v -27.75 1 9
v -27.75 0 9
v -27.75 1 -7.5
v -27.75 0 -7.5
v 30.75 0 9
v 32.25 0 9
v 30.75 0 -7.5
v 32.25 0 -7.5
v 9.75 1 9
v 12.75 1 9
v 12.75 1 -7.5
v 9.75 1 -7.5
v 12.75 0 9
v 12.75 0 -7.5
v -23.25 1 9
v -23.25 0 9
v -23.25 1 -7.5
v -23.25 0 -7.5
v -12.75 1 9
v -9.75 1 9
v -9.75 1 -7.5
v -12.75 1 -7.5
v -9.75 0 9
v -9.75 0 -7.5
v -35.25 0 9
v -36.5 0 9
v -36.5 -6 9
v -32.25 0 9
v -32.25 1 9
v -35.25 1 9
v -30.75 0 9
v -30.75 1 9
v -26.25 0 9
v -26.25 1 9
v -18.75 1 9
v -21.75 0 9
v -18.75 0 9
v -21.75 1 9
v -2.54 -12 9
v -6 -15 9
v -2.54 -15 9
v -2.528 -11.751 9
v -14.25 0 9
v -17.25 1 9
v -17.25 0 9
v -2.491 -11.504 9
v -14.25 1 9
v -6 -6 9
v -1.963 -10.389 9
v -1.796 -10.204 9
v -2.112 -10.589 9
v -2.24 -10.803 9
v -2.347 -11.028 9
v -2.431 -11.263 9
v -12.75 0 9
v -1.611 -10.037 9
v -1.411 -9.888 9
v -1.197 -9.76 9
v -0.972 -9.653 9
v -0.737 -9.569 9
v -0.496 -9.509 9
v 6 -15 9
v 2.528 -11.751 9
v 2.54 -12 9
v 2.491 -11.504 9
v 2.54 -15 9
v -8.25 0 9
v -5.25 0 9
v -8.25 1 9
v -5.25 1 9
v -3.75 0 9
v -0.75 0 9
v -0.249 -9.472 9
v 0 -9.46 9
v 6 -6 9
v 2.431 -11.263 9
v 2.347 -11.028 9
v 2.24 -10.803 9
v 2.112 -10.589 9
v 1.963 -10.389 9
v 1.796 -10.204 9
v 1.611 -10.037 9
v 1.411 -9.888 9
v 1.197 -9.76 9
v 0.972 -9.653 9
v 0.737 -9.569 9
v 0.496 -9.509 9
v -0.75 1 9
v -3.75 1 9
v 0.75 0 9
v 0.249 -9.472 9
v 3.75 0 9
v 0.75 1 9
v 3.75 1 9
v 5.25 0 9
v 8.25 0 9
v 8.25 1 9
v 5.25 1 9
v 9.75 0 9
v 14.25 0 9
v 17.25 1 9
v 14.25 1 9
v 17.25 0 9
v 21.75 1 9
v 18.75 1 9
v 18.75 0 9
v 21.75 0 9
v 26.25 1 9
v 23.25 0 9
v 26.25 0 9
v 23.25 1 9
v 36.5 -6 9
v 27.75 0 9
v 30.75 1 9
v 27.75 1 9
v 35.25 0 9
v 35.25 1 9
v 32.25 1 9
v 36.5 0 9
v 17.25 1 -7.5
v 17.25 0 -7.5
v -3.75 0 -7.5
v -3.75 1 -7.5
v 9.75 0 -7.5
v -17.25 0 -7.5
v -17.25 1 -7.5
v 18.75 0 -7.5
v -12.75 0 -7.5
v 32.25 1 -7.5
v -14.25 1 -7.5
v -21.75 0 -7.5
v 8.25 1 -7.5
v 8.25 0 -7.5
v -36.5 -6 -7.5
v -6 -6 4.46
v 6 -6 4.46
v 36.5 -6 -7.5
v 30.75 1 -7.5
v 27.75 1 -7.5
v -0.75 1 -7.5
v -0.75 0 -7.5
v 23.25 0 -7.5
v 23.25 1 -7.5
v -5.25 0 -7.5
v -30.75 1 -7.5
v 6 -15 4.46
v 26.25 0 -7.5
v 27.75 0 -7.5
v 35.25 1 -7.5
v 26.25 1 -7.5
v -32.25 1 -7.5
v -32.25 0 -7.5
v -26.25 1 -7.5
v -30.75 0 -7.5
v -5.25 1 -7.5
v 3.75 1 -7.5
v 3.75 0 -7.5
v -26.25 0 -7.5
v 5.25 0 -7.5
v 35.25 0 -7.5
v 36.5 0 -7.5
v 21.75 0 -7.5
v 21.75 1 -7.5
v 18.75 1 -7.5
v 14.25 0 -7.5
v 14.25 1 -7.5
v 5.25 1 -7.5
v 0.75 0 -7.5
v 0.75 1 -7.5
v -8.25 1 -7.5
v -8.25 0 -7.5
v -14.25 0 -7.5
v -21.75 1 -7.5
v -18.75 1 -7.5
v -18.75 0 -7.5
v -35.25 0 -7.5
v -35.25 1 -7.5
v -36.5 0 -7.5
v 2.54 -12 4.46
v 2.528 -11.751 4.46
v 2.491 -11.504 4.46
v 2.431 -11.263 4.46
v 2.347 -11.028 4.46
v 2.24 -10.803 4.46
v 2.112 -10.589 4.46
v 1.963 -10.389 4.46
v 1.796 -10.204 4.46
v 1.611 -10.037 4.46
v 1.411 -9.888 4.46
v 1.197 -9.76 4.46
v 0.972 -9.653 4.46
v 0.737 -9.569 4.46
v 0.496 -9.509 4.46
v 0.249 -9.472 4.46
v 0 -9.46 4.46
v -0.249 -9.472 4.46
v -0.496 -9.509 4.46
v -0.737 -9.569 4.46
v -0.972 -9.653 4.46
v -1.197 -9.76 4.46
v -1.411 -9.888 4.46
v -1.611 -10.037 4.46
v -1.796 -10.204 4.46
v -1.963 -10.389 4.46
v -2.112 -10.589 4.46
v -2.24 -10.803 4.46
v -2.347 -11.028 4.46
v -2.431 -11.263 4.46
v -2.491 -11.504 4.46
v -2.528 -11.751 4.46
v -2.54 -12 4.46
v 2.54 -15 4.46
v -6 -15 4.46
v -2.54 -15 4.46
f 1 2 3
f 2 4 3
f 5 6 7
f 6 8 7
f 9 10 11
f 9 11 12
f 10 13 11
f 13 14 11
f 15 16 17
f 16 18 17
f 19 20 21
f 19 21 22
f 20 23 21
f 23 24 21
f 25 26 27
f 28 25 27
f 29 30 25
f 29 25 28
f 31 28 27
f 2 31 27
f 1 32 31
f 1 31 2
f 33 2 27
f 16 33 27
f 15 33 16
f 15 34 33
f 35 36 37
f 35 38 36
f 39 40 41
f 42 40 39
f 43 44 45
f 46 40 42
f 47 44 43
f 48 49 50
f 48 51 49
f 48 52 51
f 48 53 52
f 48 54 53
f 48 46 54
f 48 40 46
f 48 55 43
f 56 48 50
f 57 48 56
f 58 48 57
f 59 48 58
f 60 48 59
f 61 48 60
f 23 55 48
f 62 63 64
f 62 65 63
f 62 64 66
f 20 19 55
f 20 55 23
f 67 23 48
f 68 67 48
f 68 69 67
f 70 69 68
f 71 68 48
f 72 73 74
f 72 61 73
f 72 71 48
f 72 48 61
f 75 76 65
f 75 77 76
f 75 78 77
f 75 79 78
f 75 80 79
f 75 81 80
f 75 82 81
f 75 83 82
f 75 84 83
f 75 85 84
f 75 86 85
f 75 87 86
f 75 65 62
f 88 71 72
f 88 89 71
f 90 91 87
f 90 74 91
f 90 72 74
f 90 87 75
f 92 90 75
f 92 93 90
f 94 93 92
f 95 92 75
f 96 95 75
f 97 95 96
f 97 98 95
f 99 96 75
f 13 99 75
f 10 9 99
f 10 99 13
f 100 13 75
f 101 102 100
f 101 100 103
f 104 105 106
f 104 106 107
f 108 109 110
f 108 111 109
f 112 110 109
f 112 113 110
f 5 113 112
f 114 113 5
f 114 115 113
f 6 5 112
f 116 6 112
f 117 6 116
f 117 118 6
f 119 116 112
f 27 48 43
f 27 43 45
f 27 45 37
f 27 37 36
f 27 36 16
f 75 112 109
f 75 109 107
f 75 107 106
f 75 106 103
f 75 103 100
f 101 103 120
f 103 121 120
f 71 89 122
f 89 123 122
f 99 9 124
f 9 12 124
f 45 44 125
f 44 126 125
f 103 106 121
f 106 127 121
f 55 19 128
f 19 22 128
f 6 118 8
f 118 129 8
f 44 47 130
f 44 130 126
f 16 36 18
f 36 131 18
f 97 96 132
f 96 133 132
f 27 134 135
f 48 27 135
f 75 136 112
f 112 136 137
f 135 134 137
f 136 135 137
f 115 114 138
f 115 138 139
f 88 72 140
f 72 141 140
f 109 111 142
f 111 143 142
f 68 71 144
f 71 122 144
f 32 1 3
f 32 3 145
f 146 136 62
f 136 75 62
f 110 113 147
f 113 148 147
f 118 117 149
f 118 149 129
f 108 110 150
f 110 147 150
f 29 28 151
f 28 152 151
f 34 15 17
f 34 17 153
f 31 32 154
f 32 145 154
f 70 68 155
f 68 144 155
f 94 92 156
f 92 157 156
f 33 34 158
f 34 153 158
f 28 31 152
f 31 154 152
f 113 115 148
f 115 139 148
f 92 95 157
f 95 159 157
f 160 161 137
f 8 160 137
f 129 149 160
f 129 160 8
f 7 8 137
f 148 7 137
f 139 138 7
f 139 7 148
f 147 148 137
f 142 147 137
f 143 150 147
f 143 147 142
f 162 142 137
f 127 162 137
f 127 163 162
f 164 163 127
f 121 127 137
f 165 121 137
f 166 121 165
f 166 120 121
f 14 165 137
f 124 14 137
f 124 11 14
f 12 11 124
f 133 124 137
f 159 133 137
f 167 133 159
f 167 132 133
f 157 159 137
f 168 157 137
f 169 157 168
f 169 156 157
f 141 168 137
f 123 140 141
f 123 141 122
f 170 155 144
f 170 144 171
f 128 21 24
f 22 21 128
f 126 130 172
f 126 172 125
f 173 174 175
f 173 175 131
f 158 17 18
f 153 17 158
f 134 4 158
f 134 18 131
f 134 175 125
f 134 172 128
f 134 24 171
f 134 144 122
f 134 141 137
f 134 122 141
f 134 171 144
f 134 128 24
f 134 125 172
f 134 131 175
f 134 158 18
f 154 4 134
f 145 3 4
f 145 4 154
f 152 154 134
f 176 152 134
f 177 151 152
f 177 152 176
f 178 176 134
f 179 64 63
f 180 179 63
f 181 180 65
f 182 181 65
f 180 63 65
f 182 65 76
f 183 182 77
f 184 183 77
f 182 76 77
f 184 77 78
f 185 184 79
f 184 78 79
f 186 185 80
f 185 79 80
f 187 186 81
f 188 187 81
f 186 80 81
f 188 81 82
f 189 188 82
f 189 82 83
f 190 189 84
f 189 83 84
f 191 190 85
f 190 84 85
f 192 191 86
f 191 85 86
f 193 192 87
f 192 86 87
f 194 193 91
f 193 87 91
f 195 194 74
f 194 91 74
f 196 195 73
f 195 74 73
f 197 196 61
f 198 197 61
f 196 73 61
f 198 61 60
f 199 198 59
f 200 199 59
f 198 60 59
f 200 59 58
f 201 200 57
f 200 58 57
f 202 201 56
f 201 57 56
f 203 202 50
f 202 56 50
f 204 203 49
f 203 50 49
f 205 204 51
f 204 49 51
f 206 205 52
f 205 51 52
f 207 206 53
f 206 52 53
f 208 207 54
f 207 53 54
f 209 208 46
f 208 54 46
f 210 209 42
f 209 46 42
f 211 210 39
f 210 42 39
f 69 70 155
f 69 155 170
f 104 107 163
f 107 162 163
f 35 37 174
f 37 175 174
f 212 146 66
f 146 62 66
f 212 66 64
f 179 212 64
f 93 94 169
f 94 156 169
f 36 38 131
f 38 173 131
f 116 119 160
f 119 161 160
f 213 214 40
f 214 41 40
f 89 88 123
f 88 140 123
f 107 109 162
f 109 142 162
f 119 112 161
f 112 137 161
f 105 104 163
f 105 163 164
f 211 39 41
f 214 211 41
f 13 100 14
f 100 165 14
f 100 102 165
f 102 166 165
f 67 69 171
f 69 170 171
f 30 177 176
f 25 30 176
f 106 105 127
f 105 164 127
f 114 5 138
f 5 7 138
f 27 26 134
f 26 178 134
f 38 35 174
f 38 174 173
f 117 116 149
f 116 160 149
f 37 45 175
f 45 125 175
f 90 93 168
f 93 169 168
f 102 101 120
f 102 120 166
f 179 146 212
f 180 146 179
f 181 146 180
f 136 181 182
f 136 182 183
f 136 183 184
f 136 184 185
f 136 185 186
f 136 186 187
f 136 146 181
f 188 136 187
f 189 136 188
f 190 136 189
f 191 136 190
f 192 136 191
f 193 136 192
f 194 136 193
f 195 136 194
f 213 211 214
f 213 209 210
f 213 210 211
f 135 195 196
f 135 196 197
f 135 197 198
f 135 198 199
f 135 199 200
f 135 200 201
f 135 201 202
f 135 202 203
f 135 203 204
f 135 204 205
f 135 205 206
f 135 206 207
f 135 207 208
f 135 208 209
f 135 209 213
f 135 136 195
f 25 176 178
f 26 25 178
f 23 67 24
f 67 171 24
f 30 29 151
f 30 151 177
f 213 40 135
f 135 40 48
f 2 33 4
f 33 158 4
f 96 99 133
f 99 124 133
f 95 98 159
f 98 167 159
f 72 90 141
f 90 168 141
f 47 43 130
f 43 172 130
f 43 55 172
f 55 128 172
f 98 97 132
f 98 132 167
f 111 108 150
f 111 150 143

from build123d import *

# Parameters (mm, degrees)
SKETCH4_W            = 73
SKETCH4_H            = 15
BOSS_EXTRUDE4_DEPTH  = 6
SKETCH15_W           = 3
SKETCH15_H           = 15
BOSS_EXTRUDE6_DEPTH  = 1
BOSS_EXTRUDE7_DEPTH  = 1.5
BOSS_EXTRUDE13_DEPTH = 7.715
CUT_EXTRUDE2_REACH   = 40.656
SKETCH22_W           = 12
SKETCH22_H           = 3.715
CUT_EXTRUDE3_REACH   = 42.428
BOSS_EXTRUDE14_DEPTH = 2.54


with BuildPart() as part:
    # Sketch4 → Boss-Extrude4 (new body)
    with BuildSketch(Plane(origin=(0, 0, 0), x_dir=(-1, 0, 0), z_dir=(0, 1, 0))):
        Rectangle(SKETCH4_W, SKETCH4_H)
    extrude(amount=-BOSS_EXTRUDE4_DEPTH)

    # Sketch15 → Boss-Extrude6 (add)
    with BuildSketch(Plane(origin=(0, 0, 0), x_dir=(1, 0, 0), z_dir=(0, 1, 0))):
        with Locations((2.25, 0)):
            Rectangle(SKETCH15_W, SKETCH15_H)
        with Locations((6.75, 0)):
            Rectangle(SKETCH15_W, SKETCH15_H)
        with Locations((11.25, 0)):
            Rectangle(SKETCH15_W, SKETCH15_H)
        with Locations((15.75, 0)):
            Rectangle(SKETCH15_W, SKETCH15_H)
        with Locations((20.25, 0)):
            Rectangle(SKETCH15_W, SKETCH15_H)
        with Locations((24.75, 0)):
            Rectangle(SKETCH15_W, SKETCH15_H)
        with Locations((29.25, 0)):
            Rectangle(SKETCH15_W, SKETCH15_H)
        with Locations((33.75, 0)):
            Rectangle(SKETCH15_W, SKETCH15_H)
        with Locations((-33.75, 0)):
            Rectangle(SKETCH15_W, SKETCH15_H)
        with Locations((-29.25, 0)):
            Rectangle(SKETCH15_W, SKETCH15_H)
        with Locations((-24.75, 0)):
            Rectangle(SKETCH15_W, SKETCH15_H)
        with Locations((-20.25, 0)):
            Rectangle(SKETCH15_W, SKETCH15_H)
        with Locations((-15.75, 0)):
            Rectangle(SKETCH15_W, SKETCH15_H)
        with Locations((-11.25, 0)):
            Rectangle(SKETCH15_W, SKETCH15_H)
        with Locations((-6.75, 0)):
            Rectangle(SKETCH15_W, SKETCH15_H)
        with Locations((-2.25, 0)):
            Rectangle(SKETCH15_W, SKETCH15_H)
    extrude(amount=BOSS_EXTRUDE6_DEPTH)

    # Sketch16 → Boss-Extrude7 (add)
    with BuildSketch(Plane.XY.offset(7.5)):
        Polygon((-35.25, 0), (-36.5, 0), (-36.5, -6), (36.5, -6), (36.5, 0), (35.25, 0), (35.25, 1), (32.25, 1), (32.25, 0), (30.75, 0), (30.75, 1), (27.75, 1), (27.75, 0), (26.25, 0), (26.25, 1), (23.25, 1), (23.25, 0), (21.75, 0), (21.75, 1), (18.75, 1), (18.75, 0), (17.25, 0), (17.25, 1), (14.25, 1), (14.25, 0), (12.75, 0), (12.75, 1), (9.75, 1), (9.75, 0), (8.25, 0), (8.25, 1), (5.25, 1), (5.25, 0), (3.75, 0), (3.75, 1), (0.75, 1), (0.75, 0), (-0.75, 0), (-0.75, 1), (-3.75, 1), (-3.75, 0), (-5.25, 0), (-5.25, 1), (-8.25, 1), (-8.25, 0), (-9.75, 0), (-9.75, 1), (-12.75, 1), (-12.75, 0), (-14.25, 0), (-14.25, 1), (-17.25, 1), (-17.25, 0), (-18.75, 0), (-18.75, 1), (-21.75, 1), (-21.75, 0), (-23.25, 0), (-23.25, 1), (-26.25, 1), (-26.25, 0), (-27.75, 0), (-27.75, 1), (-30.75, 1), (-30.75, 0), (-32.25, 0), (-32.25, 1), (-35.25, 1), align=None)
    extrude(amount=BOSS_EXTRUDE7_DEPTH)

    # Sketch21 → Boss-Extrude13 (add)
    with BuildSketch(Plane.XY.offset(9)):
        with BuildLine():
            Line((-2.54, -12), (-2.54, -15))
            Line((-2.54, -15), (-6, -15))
            Line((-6, -15), (-6, -6))
            Line((-6, -6), (6, -6))
            Line((6, -6), (6, -15))
            Line((6, -15), (2.54, -15))
            Line((2.54, -15), (2.54, -12))
            ThreePointArc((2.54, -12), (0, -9.46), (-2.54, -12))
        make_face()
    extrude(amount=-BOSS_EXTRUDE13_DEPTH)

    # Cut-Extrude2: up to this face of the body (flat: up to its plane)
    cut_extrude2_end = Plane(part.part.faces().sort_by_distance((4.27, -15, 5.1425))[0])
    # Sketch22 → Cut-Extrude2 (cut, up to the picked face)
    with BuildSketch(Plane.XZ.offset(6), mode=Mode.PRIVATE) as cut_extrude2_sk1:
        with Locations((0, 5.1425)):
            Rectangle(SKETCH22_W, SKETCH22_H)
    cut_extrude2_tool1 = split(extrude(cut_extrude2_sk1.sketch, amount=CUT_EXTRUDE2_REACH, mode=Mode.PRIVATE), bisect_by=cut_extrude2_end, keep=Keep.BOTH, mode=Mode.PRIVATE)
    add(cut_extrude2_tool1.solids().sort_by(Axis((0, -6, 5.1425), (0, -1, 0)))[0], mode=Mode.SUBTRACT)

    # Sketch23 → Cut-Extrude3 (cut, up to next)
    with BuildSketch(Plane(origin=(0, 0, 1.285), x_dir=(-1, 0, 0), z_dir=(0, 0, -1)), mode=Mode.PRIVATE) as cut_extrude3_sk1:
        with BuildLine():
            Line((6, -15), (6, -6))
            Line((6, -6), (-6, -6))
            Line((-6, -6), (-6, -15))
            Line((-6, -15), (-2.54, -15))
            Line((-2.54, -15), (-2.54, -12))
            ThreePointArc((-2.54, -12), (0, -9.46), (2.54, -12))
            Line((2.54, -12), (2.54, -15))
            Line((2.54, -15), (6, -15))
        make_face()
    cut_extrude3_tool1 = extrude(cut_extrude3_sk1.sketch, amount=-CUT_EXTRUDE3_REACH, mode=Mode.PRIVATE) & part.part
    add(cut_extrude3_tool1.solids().sort_by_distance((-5.85, -10.5, 1.285))[0], mode=Mode.SUBTRACT)

    # Sketch24 → Boss-Extrude14 (add)
    with BuildSketch(Plane(origin=(0, 0, 7), x_dir=(-1, 0, 0), z_dir=(0, 0, -1))):
        with BuildLine():
            Line((2.54, -12), (2.54, -15))
            Line((2.54, -15), (6, -15))
            Line((6, -15), (6, -6))
            Line((6, -6), (-6, -6))
            Line((-6, -6), (-6, -15))
            Line((-6, -15), (-2.54, -15))
            Line((-2.54, -15), (-2.54, -12))
            ThreePointArc((-2.54, -12), (0, -9.46), (2.54, -12))
        make_face()
    extrude(amount=BOSS_EXTRUDE14_DEPTH)


solid = part.part
